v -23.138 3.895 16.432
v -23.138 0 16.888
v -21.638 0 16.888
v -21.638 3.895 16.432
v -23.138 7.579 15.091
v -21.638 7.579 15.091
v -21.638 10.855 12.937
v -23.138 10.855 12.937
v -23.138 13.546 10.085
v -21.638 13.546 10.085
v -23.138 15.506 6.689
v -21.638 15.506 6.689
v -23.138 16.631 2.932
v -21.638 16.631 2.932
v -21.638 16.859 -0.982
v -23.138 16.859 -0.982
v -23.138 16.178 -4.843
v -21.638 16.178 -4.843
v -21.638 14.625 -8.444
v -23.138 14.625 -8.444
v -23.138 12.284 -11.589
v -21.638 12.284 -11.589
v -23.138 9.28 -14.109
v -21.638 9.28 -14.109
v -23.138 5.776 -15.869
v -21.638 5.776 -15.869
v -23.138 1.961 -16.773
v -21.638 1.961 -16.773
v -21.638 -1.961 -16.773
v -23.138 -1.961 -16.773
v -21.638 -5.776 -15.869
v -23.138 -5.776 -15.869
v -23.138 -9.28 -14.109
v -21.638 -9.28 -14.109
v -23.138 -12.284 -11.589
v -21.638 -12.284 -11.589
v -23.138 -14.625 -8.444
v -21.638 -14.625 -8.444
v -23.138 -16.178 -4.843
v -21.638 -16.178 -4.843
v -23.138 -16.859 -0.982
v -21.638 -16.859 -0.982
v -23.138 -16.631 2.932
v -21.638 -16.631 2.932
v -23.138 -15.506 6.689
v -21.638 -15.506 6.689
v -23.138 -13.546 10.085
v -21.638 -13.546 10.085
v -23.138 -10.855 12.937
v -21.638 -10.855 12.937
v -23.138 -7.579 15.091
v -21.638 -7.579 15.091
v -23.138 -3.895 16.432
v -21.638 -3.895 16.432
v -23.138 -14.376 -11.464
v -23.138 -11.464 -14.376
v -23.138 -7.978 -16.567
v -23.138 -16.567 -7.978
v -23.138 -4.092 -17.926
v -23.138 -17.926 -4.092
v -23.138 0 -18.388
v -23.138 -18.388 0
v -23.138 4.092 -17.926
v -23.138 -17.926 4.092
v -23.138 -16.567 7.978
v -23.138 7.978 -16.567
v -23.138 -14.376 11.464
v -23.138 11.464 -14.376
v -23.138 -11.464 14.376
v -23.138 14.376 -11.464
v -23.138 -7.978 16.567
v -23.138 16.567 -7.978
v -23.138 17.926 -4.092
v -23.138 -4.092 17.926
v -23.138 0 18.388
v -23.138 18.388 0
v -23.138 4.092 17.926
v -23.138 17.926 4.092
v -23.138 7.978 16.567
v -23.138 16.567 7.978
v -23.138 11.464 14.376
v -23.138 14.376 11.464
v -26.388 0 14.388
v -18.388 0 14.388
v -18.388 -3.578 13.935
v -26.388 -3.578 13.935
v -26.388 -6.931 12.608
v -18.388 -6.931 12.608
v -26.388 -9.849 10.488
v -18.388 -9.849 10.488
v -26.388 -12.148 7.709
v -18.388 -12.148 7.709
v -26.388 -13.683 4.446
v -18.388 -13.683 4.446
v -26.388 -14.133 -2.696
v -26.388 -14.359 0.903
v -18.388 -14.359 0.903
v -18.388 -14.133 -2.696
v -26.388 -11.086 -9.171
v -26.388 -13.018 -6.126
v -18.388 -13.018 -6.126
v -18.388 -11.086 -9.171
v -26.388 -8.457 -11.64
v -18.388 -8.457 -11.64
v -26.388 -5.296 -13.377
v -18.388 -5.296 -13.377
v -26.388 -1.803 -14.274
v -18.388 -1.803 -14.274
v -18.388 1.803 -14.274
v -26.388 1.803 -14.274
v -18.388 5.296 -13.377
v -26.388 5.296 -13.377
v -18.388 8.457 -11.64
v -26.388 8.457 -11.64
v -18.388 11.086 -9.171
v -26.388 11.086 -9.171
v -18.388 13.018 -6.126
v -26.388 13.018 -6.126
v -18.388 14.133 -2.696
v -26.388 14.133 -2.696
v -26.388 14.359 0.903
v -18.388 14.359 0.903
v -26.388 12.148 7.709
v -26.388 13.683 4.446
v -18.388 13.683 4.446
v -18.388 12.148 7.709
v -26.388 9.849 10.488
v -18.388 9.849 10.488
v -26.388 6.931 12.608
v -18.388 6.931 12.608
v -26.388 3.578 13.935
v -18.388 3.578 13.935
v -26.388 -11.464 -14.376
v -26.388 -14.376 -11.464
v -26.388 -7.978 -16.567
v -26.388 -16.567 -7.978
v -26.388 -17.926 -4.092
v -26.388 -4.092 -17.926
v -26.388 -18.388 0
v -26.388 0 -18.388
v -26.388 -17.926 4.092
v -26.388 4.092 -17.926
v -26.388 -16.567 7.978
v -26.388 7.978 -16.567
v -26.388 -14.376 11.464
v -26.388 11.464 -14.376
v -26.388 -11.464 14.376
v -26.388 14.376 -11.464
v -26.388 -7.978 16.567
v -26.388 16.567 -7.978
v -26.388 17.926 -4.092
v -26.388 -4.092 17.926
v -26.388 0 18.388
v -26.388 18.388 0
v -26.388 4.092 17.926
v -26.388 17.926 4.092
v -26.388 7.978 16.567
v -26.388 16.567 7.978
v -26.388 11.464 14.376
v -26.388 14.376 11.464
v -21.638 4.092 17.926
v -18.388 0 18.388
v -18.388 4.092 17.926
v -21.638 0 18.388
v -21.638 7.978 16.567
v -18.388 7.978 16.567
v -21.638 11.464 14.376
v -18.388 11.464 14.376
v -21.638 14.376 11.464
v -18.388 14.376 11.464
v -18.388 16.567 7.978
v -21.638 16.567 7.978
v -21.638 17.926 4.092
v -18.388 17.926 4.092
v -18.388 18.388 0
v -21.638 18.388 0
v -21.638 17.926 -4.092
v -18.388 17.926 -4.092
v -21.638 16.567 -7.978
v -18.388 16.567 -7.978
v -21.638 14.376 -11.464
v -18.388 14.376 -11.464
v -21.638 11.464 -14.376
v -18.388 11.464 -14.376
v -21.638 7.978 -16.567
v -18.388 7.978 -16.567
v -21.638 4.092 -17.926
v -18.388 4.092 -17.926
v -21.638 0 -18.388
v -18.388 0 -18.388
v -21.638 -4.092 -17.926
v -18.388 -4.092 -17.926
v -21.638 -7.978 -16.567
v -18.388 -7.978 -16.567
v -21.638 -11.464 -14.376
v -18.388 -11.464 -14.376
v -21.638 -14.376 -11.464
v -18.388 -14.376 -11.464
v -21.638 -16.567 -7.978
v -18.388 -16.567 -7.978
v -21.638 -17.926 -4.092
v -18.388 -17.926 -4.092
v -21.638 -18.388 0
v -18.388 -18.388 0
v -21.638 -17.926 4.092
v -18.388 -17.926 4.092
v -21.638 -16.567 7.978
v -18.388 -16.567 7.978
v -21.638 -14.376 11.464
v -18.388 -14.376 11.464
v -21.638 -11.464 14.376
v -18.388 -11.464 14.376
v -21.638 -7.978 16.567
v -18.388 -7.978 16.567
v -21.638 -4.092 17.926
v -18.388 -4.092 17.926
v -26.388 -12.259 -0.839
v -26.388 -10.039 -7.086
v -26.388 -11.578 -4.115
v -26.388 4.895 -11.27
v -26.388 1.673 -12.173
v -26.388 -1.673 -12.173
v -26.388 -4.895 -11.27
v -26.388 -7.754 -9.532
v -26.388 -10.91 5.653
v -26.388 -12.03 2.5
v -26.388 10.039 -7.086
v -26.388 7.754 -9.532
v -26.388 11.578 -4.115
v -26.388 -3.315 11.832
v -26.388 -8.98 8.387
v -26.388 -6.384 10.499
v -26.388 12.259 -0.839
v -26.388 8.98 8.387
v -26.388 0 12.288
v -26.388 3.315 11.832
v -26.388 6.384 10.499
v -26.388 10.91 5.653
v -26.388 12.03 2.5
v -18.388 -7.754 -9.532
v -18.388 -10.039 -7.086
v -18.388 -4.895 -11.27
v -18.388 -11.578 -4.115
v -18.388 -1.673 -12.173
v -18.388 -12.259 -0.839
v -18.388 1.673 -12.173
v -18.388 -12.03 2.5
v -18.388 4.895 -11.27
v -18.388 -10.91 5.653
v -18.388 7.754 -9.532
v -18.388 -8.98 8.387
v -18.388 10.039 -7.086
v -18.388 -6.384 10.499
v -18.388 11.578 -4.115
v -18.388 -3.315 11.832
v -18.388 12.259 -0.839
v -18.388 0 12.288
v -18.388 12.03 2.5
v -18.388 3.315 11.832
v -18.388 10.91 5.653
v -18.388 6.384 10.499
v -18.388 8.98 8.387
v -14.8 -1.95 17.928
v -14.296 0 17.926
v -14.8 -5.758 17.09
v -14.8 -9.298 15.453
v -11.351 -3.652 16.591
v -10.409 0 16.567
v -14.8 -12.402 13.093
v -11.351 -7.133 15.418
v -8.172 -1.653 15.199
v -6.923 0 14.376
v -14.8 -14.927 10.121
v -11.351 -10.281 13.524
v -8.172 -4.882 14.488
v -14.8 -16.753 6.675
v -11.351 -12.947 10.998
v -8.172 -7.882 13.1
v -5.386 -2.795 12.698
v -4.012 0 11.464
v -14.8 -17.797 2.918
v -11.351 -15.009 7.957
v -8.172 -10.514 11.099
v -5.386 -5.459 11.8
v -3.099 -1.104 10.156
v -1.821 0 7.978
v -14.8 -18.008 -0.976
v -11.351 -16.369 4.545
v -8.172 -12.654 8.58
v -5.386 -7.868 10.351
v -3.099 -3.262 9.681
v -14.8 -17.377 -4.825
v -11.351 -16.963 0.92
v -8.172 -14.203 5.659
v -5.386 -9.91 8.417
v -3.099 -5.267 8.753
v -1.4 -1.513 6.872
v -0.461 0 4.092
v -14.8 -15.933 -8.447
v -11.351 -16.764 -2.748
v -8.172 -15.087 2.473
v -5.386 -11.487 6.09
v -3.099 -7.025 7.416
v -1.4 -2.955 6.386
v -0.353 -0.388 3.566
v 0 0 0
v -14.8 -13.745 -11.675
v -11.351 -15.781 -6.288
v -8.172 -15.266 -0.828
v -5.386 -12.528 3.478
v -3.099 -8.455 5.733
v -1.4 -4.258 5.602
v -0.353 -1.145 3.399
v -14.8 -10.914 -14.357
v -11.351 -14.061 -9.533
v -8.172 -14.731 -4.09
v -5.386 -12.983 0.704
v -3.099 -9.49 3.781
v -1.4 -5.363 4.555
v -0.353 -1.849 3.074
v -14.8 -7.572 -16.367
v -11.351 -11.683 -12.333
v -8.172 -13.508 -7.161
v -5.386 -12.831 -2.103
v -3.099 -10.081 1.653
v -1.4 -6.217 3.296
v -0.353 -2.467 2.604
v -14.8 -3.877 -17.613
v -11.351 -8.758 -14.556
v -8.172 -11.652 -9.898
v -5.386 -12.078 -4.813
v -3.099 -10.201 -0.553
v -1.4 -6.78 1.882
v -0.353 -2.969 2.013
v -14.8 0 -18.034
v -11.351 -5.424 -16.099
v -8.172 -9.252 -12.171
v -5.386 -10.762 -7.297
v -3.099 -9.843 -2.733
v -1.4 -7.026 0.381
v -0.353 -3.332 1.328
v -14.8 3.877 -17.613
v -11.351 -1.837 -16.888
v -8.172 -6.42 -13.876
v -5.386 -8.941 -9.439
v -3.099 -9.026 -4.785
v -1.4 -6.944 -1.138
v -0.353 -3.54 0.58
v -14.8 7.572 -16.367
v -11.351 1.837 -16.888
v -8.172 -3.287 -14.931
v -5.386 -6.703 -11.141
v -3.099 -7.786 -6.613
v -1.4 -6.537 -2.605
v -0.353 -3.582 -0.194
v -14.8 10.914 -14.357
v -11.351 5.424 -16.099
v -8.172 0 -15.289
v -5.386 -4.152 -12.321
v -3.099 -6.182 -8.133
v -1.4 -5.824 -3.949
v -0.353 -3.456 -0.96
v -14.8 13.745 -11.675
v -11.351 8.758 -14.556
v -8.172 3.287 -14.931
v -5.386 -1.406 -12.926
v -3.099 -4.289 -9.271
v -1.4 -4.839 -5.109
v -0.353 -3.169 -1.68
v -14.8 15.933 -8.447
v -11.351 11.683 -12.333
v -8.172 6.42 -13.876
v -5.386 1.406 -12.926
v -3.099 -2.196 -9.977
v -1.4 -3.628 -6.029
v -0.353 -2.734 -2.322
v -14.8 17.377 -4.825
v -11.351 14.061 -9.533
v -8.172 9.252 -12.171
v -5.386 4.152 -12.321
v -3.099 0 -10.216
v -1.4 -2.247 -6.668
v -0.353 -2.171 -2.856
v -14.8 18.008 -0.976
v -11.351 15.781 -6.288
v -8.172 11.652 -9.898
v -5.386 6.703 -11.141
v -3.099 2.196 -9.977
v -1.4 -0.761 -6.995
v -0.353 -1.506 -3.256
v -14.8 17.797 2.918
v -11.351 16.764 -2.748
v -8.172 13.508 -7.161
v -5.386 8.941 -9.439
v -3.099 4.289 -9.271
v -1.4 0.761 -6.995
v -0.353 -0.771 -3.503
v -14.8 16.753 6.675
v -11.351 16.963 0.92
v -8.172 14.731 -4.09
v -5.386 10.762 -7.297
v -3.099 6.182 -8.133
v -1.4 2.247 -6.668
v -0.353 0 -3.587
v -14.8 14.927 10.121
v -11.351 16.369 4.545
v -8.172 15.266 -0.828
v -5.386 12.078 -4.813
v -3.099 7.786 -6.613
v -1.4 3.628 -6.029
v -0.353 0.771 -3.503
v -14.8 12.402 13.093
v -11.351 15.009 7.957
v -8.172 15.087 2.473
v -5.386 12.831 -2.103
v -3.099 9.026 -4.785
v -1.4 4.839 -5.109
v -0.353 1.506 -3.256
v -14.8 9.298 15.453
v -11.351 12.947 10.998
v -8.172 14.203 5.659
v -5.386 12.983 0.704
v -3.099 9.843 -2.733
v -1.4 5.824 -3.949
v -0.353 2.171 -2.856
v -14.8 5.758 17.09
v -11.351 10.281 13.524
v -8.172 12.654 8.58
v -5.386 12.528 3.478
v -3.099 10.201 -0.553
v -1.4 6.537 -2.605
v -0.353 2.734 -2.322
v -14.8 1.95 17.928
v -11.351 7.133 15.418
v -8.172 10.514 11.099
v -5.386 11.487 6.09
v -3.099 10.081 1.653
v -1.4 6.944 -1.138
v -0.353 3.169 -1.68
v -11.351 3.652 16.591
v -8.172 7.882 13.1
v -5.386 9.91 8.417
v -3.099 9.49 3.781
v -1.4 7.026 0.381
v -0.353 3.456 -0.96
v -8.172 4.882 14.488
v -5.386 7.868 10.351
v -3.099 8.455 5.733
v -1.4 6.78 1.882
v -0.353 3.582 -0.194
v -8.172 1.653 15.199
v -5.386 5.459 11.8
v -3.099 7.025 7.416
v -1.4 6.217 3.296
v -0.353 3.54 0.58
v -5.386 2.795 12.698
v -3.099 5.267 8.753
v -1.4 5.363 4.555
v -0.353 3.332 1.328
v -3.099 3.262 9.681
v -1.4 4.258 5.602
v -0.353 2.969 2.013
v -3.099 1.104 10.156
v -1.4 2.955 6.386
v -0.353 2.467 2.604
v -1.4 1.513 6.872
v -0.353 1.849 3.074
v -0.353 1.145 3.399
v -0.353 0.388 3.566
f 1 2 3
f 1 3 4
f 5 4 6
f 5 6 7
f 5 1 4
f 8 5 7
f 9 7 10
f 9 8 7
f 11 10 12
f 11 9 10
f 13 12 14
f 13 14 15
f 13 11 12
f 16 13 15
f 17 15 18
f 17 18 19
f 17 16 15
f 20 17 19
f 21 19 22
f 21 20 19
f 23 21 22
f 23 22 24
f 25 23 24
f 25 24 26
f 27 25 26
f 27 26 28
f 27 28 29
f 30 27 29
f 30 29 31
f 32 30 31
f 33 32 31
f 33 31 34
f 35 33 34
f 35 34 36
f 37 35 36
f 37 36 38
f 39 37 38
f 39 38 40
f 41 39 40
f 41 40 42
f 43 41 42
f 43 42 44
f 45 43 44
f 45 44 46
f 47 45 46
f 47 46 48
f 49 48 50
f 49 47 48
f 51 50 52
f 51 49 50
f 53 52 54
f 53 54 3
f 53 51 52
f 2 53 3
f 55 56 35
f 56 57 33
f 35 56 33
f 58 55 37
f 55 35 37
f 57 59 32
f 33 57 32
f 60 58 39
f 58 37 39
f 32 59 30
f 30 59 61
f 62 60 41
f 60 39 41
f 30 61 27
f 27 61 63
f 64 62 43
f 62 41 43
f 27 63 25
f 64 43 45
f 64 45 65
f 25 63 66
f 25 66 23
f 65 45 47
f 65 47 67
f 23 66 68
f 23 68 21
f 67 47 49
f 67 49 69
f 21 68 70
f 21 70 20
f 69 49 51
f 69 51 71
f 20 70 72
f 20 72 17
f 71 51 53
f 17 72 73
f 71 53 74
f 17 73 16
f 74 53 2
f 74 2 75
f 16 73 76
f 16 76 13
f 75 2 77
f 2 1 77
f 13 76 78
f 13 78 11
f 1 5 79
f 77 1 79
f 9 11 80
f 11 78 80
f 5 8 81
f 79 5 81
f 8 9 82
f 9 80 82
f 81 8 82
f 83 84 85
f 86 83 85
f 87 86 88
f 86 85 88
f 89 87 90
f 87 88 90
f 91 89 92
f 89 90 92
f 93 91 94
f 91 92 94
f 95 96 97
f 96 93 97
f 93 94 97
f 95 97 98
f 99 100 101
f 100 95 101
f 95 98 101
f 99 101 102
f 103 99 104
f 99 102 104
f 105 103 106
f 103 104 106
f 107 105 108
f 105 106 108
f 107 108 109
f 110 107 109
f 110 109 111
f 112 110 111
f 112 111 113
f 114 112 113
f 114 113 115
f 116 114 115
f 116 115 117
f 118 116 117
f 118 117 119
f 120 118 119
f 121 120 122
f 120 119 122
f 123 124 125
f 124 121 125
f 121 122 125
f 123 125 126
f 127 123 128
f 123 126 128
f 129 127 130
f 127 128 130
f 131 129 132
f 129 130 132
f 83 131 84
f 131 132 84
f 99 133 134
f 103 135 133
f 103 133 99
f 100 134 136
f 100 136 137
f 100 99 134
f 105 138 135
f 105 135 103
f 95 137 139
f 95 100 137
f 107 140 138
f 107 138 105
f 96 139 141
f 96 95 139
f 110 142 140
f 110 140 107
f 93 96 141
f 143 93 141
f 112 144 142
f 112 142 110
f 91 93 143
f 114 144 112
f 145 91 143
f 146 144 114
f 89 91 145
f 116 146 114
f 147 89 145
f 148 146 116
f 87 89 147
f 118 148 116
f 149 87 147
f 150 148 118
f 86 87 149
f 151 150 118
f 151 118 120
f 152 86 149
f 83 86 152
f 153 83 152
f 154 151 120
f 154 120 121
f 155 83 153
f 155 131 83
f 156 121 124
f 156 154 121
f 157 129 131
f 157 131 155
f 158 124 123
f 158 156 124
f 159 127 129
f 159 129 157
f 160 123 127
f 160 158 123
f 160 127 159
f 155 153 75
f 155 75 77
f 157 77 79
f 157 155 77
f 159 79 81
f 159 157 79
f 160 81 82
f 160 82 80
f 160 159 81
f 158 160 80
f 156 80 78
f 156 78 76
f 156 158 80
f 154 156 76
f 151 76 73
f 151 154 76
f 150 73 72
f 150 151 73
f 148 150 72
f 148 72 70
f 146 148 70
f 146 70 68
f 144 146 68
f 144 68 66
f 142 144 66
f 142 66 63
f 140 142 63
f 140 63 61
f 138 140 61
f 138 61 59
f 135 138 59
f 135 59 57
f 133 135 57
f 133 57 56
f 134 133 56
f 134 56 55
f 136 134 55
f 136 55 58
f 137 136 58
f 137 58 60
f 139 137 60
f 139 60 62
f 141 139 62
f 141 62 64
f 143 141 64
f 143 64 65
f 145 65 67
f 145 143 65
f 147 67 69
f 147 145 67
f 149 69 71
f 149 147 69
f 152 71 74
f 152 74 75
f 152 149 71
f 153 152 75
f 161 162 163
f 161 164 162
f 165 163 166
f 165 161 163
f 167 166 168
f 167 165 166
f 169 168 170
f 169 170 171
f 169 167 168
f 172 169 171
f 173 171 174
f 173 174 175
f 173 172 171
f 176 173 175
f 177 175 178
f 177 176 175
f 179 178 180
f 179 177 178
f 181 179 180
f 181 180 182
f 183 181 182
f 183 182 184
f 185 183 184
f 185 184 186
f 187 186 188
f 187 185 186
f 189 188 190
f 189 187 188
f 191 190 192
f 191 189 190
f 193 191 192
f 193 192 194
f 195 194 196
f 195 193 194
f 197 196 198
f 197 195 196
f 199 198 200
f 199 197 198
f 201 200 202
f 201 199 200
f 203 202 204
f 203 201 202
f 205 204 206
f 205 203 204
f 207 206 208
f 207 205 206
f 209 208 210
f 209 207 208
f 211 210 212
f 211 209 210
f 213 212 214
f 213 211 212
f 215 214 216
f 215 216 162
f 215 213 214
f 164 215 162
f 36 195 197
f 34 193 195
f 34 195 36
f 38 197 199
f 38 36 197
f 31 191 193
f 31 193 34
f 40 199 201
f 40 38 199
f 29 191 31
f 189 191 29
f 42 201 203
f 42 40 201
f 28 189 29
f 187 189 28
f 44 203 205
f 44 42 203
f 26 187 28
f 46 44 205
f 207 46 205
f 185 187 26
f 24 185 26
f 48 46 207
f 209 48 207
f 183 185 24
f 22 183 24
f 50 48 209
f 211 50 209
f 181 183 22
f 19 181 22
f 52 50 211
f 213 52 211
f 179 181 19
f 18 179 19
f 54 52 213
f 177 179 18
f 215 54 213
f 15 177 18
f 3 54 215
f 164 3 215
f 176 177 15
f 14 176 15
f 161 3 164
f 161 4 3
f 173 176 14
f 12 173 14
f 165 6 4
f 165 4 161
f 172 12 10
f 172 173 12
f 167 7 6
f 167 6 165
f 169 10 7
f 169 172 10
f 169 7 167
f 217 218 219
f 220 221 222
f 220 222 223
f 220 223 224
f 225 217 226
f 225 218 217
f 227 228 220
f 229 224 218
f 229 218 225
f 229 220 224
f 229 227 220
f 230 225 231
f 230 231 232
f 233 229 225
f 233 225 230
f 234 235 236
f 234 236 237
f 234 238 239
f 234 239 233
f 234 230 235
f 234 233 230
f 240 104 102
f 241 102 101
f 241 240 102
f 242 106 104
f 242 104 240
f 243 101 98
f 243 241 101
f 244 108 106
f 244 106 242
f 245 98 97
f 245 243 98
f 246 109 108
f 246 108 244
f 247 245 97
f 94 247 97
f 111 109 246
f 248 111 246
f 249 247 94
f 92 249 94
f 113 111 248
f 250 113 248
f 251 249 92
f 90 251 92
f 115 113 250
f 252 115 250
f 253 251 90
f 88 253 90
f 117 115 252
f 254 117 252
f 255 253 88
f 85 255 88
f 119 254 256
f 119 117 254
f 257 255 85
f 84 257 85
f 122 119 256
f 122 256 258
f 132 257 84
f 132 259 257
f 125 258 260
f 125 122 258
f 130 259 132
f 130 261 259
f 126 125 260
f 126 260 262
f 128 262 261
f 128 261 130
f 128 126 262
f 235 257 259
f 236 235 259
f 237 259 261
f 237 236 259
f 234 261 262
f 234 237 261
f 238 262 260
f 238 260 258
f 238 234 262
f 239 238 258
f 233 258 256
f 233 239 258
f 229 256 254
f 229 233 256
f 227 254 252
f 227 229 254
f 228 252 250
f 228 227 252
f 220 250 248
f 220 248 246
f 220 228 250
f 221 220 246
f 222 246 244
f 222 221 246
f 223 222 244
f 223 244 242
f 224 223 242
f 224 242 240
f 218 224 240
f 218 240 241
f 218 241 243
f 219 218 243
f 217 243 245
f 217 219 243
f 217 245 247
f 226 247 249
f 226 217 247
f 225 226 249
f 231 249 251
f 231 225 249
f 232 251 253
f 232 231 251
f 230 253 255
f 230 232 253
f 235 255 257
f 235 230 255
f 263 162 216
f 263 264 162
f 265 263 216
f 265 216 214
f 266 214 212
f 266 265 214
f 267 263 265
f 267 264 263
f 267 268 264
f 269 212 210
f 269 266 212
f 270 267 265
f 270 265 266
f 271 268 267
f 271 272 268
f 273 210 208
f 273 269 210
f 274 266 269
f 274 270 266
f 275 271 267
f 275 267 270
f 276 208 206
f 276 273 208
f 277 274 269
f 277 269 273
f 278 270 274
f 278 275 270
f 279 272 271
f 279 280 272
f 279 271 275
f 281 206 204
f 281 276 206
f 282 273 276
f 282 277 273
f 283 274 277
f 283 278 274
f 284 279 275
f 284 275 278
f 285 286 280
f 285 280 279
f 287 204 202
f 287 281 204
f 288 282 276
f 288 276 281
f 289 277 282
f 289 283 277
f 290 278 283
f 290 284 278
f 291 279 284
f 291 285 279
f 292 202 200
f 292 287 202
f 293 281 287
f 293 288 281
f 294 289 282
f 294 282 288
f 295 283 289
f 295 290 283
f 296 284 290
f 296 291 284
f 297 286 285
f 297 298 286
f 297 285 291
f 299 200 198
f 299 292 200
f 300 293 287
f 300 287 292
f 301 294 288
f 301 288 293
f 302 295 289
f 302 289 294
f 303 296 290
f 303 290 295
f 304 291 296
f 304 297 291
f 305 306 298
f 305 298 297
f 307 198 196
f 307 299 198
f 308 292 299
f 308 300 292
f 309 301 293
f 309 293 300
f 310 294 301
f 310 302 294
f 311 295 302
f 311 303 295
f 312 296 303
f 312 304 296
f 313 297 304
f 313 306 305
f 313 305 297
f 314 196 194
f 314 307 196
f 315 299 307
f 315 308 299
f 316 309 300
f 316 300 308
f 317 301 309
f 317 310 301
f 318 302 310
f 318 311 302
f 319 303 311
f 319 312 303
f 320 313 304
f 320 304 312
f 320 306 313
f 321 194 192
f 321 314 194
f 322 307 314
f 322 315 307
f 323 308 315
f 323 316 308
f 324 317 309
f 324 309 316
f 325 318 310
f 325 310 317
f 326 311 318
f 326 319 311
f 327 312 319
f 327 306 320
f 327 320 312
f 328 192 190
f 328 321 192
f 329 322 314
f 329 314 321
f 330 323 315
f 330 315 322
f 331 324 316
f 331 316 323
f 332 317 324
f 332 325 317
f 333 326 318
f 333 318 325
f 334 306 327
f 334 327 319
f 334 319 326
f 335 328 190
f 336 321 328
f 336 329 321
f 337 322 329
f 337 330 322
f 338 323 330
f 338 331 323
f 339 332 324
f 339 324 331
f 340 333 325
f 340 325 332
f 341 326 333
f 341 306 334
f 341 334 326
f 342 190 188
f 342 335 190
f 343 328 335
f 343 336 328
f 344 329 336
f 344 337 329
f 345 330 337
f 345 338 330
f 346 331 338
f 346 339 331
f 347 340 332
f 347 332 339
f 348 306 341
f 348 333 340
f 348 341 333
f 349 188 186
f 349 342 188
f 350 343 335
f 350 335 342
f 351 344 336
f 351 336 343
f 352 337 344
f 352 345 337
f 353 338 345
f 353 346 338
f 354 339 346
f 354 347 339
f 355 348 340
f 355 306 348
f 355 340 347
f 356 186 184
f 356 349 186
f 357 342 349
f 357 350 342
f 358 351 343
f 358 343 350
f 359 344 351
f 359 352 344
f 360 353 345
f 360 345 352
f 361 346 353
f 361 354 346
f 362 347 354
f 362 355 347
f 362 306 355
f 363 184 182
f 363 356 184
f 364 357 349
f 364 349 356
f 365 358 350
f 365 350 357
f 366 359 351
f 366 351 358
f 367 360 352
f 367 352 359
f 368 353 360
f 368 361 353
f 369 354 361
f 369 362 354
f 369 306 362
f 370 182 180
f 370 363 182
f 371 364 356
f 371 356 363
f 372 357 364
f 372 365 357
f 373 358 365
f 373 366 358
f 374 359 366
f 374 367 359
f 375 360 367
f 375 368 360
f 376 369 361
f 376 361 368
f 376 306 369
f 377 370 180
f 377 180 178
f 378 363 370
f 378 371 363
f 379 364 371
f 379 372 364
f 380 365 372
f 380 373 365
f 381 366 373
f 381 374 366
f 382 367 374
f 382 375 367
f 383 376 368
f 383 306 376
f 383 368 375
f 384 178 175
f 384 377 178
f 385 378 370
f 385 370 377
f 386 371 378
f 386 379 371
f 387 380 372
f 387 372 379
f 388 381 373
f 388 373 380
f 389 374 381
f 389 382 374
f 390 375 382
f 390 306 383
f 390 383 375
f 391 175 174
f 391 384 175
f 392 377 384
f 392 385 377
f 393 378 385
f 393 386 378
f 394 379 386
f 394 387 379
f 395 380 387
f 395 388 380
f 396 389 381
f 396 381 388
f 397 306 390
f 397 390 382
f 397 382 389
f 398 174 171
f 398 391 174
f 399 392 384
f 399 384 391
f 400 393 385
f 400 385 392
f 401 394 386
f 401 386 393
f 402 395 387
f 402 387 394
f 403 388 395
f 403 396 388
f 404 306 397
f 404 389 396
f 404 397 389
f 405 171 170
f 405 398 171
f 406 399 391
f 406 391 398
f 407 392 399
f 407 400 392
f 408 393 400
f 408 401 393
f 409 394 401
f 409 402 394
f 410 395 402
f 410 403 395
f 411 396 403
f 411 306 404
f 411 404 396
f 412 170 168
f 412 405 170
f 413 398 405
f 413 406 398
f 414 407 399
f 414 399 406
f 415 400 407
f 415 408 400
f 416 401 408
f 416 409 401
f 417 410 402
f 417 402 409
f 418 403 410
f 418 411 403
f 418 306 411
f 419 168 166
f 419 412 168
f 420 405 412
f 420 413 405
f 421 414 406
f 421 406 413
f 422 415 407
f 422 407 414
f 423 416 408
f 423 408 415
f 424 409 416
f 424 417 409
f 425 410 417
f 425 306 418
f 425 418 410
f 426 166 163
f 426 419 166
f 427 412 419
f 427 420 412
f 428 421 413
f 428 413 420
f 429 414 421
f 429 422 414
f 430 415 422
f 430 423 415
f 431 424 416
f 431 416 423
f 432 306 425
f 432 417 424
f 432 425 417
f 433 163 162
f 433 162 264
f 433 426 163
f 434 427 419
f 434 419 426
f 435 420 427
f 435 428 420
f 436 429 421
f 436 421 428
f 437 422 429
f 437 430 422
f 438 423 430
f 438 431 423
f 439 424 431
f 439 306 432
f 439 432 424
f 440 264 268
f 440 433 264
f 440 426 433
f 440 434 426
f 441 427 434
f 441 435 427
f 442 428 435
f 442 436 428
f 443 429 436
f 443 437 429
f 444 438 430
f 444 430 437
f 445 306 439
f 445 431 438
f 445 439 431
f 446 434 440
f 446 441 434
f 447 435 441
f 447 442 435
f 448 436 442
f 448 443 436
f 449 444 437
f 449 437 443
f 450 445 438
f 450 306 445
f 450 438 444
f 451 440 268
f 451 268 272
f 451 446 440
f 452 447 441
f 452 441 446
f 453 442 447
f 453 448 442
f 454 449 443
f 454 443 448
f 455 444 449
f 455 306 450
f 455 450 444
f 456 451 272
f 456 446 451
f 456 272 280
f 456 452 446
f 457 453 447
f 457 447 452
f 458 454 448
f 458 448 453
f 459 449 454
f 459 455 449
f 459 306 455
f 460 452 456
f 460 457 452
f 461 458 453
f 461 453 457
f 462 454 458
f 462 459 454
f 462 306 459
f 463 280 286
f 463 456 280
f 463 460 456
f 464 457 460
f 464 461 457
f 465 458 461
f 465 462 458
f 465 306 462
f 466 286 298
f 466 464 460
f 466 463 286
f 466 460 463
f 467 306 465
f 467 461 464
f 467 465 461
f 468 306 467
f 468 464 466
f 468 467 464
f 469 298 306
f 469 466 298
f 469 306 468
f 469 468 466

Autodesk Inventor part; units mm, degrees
ref_plane "YZ Plane" through (0, 0, 0) normal (1, 0, 0) x (0, 1, 0)
ref_plane "XZ Plane" through (0, 0, 0) normal (0, 1, 0) x (-1, 0, 0)
ref_plane "XY Plane" through (0, 0, 0) normal (0, 0, 1) x (1, 0, 0)
sketch "Boceto1" plane through (0, 0, 0) normal (0, 1, 0) x (-1, 0, 0)
  line L0 (18.3875, 12.2875) -> (26.3875, 12.2875)
  line L1 (26.3875, -12.2875) -> (18.3875, -12.2875) construction
  line L2 (26.3875, 18.3875) -> (26.3875, 14.3875)
  line L3 (26.3875, 14.3875) -> (18.3875, 14.3875)
  line L4 (18.3875, 14.3875) -> (18.3875, 12.2875)
  line L5 (18.3875, -12.2875) -> (18.3875, -14.3875) construction
  line L6 (18.3875, -14.3875) -> (26.3875, -14.3875) construction
  line L7 (26.3875, -14.3875) -> (26.3875, -18.3875) construction
  line L8 (18.3875, 18.3875) -> (21.6375, 18.3875)
  line L9 (21.6375, 18.3875) -> (21.6375, 16.8875)
  line L10 (21.6375, 16.8875) -> (23.1375, 16.8875)
  line L11 (23.1375, 16.8875) -> (23.1375, 18.3875)
  line L12 (23.1375, 18.3875) -> (26.3875, 18.3875)
  line L13 (18.3875, -18.3875) -> (21.6375, -18.3875) construction
  line L14 (21.6375, -18.3875) -> (21.6375, -16.8875) construction
  line L15 (21.6375, -16.8875) -> (23.1375, -16.8875) construction
  line L16 (23.1375, -16.8875) -> (23.1375, -18.3875) construction
  line L17 (23.1375, -18.3875) -> (26.3875, -18.3875) construction
  line L18 (0, 0) -> (26.3875, 0)
  line L19 (26.3875, 12.2875) -> (26.3875, 0)
  line L20 (26.3875, 0) -> (26.3875, -12.2875) construction
  arc A0 (18.3875, 18.3875) -> (0, 0) centre (18.3875, 0) ccw
  arc A1 (0, 0) -> (18.3875, -18.3875) centre (18.3875, 0) ccw construction
  point P0 (26.3875, 16.3875)
  point P1 (26.3875, -16.3875)
  dimension "d0" = 24.575
  dimension "d3" = 2.1
  dimension "d4" = 4
  dimension "d5" = 8
  dimension "d6" = 1.5
  dimension "d8" = 3.25
revolve "Revolución1" add sketch "Boceto1" angle 360 about axis through (0, 0, 0) along (-1, 0, 0)
equation "\"d0\" = diametro_agujero_brazo"
equation "\"d3\" = 1.05 * grosor_pared_agujero_brazo"
equation "\"d5\" = profundidad_agujero_brazo"
equation "\"d8\" = -0.5 * d6 + 0.5 * d5"
equation "\"diametro_agujero_brazo\" = 24.575"
equation "\"grosor_pared_agujero_brazo\" = 2"
equation "\"profundidad_agujero_brazo\" = 8"
properties part number "Pata - Pie"
